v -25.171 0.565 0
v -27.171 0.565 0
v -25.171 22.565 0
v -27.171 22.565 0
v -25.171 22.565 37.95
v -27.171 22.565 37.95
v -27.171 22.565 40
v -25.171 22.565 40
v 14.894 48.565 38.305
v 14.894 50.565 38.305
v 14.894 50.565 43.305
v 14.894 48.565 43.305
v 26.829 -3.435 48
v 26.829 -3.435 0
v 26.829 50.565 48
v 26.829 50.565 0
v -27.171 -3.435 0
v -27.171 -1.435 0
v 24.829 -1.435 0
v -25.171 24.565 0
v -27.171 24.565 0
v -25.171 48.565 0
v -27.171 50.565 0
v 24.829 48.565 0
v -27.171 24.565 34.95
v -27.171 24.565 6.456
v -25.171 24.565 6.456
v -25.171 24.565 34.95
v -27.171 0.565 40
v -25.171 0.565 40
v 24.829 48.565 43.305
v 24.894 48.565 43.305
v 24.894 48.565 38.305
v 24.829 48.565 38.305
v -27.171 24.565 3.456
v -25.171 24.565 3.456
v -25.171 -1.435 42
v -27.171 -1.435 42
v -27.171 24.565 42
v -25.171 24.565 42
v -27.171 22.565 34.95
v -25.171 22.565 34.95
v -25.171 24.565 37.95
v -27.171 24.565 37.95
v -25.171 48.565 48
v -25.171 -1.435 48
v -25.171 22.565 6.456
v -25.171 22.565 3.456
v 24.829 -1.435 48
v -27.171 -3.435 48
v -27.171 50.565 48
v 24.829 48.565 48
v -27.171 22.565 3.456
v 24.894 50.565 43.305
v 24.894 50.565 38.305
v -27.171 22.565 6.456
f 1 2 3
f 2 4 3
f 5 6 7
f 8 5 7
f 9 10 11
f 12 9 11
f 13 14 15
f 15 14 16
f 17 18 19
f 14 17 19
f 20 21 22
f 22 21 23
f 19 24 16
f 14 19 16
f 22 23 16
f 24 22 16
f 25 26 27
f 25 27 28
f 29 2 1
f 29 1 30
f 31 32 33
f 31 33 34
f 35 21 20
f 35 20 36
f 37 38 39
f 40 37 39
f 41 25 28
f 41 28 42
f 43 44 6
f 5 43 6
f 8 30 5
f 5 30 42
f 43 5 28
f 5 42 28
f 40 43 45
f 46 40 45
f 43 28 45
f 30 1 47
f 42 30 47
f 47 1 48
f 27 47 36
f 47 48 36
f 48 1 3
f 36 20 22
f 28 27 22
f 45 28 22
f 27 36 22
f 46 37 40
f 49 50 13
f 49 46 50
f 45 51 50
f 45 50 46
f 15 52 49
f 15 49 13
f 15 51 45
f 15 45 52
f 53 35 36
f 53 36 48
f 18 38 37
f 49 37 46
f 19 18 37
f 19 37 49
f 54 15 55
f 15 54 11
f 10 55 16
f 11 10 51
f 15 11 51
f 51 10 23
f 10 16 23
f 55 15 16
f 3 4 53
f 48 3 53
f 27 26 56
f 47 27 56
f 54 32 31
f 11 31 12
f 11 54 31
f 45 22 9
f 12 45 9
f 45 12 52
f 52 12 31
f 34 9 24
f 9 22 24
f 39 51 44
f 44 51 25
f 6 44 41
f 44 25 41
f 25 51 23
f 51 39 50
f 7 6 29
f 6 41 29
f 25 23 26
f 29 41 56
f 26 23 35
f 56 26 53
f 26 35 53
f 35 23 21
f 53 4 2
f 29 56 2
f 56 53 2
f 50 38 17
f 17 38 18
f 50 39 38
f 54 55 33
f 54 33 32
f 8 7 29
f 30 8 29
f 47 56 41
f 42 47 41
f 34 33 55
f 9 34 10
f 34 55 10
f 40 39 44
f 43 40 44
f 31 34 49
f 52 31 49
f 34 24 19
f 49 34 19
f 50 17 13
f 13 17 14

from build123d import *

# Parameters (mm, degrees)
F0_W     = 50
F0_H     = 2
F1_DEPTH = 48
F3_W     = 2
F3_H     = 40
F3_H_2   = 3.4556204919
F3_H_3   = 28.4943341073
F3_H_4   = 2.0500454009
F4_DEPTH = 25
F5_W     = 10
F5_H     = 5
F6_DEPTH = 2


with BuildPart() as f1:
    # F0 (on Top) → F1 (new body)
    with BuildSketch(Plane.XY):
        with Locations((-0.1711930672, -2.4346486163)):
            Rectangle(F0_W, F0_H)
        Polygon((-27.1711930672, -3.4346486163), (-25.1711930672, -3.4346486163), (-25.1711930672, -1.4346486163), (-25.1711930672, 48.5653513837), (-25.1711930672, 50.5653513837), (-27.1711930672, 50.5653513837), align=None)
        Polygon((24.8288069328, -1.4346486163), (24.8288069328, -3.4346486163), (26.8288069328, -3.4346486163), (26.8288069328, 50.5653513837), (24.8288069328, 50.5653513837), (24.8288069328, 48.5653513837), align=None)
        with Locations((-0.1711930672, 49.5653513837)):
            Rectangle(F0_W, F0_H)
    extrude(amount=F1_DEPTH)

    # F3 (on face) → F4 (cut)
    with BuildSketch(Plane(origin=(-27.1711930672, 0, 0), x_dir=(0, -1, 0), z_dir=(-1, 0, 0))):
        with Locations((0.4346486163, 20)):
            Rectangle(F3_W, F3_H)
        with Locations((-23.5653513837, 1.7278102459)):
            Rectangle(F3_W, F3_H_2)
        with Locations((-23.5653513837, 20.7027875455)):
            Rectangle(F3_W, F3_H_3)
        with Locations((-23.5653513837, 38.9749772996)):
            Rectangle(F3_W, F3_H_4)
        Polygon((-0.5653513837, 40), (1.4346486163, 40), (1.4346486163, 42), (-24.5653513837, 42), (-24.5653513837, 40), (-22.5653513837, 40), align=None)
    extrude(amount=-F4_DEPTH, mode=Mode.SUBTRACT)

    # F5 (on face) → F6 (cut)
    with BuildSketch(Plane(origin=(0, 50.5653513837, 0), x_dir=(-1, 0, 0), z_dir=(0, 1, 0))):
        with Locations((-19.8940047994, 40.8047514008)):
            Rectangle(F5_W, F5_H)
    extrude(amount=-F6_DEPTH, mode=Mode.SUBTRACT)


solid = f1.part
